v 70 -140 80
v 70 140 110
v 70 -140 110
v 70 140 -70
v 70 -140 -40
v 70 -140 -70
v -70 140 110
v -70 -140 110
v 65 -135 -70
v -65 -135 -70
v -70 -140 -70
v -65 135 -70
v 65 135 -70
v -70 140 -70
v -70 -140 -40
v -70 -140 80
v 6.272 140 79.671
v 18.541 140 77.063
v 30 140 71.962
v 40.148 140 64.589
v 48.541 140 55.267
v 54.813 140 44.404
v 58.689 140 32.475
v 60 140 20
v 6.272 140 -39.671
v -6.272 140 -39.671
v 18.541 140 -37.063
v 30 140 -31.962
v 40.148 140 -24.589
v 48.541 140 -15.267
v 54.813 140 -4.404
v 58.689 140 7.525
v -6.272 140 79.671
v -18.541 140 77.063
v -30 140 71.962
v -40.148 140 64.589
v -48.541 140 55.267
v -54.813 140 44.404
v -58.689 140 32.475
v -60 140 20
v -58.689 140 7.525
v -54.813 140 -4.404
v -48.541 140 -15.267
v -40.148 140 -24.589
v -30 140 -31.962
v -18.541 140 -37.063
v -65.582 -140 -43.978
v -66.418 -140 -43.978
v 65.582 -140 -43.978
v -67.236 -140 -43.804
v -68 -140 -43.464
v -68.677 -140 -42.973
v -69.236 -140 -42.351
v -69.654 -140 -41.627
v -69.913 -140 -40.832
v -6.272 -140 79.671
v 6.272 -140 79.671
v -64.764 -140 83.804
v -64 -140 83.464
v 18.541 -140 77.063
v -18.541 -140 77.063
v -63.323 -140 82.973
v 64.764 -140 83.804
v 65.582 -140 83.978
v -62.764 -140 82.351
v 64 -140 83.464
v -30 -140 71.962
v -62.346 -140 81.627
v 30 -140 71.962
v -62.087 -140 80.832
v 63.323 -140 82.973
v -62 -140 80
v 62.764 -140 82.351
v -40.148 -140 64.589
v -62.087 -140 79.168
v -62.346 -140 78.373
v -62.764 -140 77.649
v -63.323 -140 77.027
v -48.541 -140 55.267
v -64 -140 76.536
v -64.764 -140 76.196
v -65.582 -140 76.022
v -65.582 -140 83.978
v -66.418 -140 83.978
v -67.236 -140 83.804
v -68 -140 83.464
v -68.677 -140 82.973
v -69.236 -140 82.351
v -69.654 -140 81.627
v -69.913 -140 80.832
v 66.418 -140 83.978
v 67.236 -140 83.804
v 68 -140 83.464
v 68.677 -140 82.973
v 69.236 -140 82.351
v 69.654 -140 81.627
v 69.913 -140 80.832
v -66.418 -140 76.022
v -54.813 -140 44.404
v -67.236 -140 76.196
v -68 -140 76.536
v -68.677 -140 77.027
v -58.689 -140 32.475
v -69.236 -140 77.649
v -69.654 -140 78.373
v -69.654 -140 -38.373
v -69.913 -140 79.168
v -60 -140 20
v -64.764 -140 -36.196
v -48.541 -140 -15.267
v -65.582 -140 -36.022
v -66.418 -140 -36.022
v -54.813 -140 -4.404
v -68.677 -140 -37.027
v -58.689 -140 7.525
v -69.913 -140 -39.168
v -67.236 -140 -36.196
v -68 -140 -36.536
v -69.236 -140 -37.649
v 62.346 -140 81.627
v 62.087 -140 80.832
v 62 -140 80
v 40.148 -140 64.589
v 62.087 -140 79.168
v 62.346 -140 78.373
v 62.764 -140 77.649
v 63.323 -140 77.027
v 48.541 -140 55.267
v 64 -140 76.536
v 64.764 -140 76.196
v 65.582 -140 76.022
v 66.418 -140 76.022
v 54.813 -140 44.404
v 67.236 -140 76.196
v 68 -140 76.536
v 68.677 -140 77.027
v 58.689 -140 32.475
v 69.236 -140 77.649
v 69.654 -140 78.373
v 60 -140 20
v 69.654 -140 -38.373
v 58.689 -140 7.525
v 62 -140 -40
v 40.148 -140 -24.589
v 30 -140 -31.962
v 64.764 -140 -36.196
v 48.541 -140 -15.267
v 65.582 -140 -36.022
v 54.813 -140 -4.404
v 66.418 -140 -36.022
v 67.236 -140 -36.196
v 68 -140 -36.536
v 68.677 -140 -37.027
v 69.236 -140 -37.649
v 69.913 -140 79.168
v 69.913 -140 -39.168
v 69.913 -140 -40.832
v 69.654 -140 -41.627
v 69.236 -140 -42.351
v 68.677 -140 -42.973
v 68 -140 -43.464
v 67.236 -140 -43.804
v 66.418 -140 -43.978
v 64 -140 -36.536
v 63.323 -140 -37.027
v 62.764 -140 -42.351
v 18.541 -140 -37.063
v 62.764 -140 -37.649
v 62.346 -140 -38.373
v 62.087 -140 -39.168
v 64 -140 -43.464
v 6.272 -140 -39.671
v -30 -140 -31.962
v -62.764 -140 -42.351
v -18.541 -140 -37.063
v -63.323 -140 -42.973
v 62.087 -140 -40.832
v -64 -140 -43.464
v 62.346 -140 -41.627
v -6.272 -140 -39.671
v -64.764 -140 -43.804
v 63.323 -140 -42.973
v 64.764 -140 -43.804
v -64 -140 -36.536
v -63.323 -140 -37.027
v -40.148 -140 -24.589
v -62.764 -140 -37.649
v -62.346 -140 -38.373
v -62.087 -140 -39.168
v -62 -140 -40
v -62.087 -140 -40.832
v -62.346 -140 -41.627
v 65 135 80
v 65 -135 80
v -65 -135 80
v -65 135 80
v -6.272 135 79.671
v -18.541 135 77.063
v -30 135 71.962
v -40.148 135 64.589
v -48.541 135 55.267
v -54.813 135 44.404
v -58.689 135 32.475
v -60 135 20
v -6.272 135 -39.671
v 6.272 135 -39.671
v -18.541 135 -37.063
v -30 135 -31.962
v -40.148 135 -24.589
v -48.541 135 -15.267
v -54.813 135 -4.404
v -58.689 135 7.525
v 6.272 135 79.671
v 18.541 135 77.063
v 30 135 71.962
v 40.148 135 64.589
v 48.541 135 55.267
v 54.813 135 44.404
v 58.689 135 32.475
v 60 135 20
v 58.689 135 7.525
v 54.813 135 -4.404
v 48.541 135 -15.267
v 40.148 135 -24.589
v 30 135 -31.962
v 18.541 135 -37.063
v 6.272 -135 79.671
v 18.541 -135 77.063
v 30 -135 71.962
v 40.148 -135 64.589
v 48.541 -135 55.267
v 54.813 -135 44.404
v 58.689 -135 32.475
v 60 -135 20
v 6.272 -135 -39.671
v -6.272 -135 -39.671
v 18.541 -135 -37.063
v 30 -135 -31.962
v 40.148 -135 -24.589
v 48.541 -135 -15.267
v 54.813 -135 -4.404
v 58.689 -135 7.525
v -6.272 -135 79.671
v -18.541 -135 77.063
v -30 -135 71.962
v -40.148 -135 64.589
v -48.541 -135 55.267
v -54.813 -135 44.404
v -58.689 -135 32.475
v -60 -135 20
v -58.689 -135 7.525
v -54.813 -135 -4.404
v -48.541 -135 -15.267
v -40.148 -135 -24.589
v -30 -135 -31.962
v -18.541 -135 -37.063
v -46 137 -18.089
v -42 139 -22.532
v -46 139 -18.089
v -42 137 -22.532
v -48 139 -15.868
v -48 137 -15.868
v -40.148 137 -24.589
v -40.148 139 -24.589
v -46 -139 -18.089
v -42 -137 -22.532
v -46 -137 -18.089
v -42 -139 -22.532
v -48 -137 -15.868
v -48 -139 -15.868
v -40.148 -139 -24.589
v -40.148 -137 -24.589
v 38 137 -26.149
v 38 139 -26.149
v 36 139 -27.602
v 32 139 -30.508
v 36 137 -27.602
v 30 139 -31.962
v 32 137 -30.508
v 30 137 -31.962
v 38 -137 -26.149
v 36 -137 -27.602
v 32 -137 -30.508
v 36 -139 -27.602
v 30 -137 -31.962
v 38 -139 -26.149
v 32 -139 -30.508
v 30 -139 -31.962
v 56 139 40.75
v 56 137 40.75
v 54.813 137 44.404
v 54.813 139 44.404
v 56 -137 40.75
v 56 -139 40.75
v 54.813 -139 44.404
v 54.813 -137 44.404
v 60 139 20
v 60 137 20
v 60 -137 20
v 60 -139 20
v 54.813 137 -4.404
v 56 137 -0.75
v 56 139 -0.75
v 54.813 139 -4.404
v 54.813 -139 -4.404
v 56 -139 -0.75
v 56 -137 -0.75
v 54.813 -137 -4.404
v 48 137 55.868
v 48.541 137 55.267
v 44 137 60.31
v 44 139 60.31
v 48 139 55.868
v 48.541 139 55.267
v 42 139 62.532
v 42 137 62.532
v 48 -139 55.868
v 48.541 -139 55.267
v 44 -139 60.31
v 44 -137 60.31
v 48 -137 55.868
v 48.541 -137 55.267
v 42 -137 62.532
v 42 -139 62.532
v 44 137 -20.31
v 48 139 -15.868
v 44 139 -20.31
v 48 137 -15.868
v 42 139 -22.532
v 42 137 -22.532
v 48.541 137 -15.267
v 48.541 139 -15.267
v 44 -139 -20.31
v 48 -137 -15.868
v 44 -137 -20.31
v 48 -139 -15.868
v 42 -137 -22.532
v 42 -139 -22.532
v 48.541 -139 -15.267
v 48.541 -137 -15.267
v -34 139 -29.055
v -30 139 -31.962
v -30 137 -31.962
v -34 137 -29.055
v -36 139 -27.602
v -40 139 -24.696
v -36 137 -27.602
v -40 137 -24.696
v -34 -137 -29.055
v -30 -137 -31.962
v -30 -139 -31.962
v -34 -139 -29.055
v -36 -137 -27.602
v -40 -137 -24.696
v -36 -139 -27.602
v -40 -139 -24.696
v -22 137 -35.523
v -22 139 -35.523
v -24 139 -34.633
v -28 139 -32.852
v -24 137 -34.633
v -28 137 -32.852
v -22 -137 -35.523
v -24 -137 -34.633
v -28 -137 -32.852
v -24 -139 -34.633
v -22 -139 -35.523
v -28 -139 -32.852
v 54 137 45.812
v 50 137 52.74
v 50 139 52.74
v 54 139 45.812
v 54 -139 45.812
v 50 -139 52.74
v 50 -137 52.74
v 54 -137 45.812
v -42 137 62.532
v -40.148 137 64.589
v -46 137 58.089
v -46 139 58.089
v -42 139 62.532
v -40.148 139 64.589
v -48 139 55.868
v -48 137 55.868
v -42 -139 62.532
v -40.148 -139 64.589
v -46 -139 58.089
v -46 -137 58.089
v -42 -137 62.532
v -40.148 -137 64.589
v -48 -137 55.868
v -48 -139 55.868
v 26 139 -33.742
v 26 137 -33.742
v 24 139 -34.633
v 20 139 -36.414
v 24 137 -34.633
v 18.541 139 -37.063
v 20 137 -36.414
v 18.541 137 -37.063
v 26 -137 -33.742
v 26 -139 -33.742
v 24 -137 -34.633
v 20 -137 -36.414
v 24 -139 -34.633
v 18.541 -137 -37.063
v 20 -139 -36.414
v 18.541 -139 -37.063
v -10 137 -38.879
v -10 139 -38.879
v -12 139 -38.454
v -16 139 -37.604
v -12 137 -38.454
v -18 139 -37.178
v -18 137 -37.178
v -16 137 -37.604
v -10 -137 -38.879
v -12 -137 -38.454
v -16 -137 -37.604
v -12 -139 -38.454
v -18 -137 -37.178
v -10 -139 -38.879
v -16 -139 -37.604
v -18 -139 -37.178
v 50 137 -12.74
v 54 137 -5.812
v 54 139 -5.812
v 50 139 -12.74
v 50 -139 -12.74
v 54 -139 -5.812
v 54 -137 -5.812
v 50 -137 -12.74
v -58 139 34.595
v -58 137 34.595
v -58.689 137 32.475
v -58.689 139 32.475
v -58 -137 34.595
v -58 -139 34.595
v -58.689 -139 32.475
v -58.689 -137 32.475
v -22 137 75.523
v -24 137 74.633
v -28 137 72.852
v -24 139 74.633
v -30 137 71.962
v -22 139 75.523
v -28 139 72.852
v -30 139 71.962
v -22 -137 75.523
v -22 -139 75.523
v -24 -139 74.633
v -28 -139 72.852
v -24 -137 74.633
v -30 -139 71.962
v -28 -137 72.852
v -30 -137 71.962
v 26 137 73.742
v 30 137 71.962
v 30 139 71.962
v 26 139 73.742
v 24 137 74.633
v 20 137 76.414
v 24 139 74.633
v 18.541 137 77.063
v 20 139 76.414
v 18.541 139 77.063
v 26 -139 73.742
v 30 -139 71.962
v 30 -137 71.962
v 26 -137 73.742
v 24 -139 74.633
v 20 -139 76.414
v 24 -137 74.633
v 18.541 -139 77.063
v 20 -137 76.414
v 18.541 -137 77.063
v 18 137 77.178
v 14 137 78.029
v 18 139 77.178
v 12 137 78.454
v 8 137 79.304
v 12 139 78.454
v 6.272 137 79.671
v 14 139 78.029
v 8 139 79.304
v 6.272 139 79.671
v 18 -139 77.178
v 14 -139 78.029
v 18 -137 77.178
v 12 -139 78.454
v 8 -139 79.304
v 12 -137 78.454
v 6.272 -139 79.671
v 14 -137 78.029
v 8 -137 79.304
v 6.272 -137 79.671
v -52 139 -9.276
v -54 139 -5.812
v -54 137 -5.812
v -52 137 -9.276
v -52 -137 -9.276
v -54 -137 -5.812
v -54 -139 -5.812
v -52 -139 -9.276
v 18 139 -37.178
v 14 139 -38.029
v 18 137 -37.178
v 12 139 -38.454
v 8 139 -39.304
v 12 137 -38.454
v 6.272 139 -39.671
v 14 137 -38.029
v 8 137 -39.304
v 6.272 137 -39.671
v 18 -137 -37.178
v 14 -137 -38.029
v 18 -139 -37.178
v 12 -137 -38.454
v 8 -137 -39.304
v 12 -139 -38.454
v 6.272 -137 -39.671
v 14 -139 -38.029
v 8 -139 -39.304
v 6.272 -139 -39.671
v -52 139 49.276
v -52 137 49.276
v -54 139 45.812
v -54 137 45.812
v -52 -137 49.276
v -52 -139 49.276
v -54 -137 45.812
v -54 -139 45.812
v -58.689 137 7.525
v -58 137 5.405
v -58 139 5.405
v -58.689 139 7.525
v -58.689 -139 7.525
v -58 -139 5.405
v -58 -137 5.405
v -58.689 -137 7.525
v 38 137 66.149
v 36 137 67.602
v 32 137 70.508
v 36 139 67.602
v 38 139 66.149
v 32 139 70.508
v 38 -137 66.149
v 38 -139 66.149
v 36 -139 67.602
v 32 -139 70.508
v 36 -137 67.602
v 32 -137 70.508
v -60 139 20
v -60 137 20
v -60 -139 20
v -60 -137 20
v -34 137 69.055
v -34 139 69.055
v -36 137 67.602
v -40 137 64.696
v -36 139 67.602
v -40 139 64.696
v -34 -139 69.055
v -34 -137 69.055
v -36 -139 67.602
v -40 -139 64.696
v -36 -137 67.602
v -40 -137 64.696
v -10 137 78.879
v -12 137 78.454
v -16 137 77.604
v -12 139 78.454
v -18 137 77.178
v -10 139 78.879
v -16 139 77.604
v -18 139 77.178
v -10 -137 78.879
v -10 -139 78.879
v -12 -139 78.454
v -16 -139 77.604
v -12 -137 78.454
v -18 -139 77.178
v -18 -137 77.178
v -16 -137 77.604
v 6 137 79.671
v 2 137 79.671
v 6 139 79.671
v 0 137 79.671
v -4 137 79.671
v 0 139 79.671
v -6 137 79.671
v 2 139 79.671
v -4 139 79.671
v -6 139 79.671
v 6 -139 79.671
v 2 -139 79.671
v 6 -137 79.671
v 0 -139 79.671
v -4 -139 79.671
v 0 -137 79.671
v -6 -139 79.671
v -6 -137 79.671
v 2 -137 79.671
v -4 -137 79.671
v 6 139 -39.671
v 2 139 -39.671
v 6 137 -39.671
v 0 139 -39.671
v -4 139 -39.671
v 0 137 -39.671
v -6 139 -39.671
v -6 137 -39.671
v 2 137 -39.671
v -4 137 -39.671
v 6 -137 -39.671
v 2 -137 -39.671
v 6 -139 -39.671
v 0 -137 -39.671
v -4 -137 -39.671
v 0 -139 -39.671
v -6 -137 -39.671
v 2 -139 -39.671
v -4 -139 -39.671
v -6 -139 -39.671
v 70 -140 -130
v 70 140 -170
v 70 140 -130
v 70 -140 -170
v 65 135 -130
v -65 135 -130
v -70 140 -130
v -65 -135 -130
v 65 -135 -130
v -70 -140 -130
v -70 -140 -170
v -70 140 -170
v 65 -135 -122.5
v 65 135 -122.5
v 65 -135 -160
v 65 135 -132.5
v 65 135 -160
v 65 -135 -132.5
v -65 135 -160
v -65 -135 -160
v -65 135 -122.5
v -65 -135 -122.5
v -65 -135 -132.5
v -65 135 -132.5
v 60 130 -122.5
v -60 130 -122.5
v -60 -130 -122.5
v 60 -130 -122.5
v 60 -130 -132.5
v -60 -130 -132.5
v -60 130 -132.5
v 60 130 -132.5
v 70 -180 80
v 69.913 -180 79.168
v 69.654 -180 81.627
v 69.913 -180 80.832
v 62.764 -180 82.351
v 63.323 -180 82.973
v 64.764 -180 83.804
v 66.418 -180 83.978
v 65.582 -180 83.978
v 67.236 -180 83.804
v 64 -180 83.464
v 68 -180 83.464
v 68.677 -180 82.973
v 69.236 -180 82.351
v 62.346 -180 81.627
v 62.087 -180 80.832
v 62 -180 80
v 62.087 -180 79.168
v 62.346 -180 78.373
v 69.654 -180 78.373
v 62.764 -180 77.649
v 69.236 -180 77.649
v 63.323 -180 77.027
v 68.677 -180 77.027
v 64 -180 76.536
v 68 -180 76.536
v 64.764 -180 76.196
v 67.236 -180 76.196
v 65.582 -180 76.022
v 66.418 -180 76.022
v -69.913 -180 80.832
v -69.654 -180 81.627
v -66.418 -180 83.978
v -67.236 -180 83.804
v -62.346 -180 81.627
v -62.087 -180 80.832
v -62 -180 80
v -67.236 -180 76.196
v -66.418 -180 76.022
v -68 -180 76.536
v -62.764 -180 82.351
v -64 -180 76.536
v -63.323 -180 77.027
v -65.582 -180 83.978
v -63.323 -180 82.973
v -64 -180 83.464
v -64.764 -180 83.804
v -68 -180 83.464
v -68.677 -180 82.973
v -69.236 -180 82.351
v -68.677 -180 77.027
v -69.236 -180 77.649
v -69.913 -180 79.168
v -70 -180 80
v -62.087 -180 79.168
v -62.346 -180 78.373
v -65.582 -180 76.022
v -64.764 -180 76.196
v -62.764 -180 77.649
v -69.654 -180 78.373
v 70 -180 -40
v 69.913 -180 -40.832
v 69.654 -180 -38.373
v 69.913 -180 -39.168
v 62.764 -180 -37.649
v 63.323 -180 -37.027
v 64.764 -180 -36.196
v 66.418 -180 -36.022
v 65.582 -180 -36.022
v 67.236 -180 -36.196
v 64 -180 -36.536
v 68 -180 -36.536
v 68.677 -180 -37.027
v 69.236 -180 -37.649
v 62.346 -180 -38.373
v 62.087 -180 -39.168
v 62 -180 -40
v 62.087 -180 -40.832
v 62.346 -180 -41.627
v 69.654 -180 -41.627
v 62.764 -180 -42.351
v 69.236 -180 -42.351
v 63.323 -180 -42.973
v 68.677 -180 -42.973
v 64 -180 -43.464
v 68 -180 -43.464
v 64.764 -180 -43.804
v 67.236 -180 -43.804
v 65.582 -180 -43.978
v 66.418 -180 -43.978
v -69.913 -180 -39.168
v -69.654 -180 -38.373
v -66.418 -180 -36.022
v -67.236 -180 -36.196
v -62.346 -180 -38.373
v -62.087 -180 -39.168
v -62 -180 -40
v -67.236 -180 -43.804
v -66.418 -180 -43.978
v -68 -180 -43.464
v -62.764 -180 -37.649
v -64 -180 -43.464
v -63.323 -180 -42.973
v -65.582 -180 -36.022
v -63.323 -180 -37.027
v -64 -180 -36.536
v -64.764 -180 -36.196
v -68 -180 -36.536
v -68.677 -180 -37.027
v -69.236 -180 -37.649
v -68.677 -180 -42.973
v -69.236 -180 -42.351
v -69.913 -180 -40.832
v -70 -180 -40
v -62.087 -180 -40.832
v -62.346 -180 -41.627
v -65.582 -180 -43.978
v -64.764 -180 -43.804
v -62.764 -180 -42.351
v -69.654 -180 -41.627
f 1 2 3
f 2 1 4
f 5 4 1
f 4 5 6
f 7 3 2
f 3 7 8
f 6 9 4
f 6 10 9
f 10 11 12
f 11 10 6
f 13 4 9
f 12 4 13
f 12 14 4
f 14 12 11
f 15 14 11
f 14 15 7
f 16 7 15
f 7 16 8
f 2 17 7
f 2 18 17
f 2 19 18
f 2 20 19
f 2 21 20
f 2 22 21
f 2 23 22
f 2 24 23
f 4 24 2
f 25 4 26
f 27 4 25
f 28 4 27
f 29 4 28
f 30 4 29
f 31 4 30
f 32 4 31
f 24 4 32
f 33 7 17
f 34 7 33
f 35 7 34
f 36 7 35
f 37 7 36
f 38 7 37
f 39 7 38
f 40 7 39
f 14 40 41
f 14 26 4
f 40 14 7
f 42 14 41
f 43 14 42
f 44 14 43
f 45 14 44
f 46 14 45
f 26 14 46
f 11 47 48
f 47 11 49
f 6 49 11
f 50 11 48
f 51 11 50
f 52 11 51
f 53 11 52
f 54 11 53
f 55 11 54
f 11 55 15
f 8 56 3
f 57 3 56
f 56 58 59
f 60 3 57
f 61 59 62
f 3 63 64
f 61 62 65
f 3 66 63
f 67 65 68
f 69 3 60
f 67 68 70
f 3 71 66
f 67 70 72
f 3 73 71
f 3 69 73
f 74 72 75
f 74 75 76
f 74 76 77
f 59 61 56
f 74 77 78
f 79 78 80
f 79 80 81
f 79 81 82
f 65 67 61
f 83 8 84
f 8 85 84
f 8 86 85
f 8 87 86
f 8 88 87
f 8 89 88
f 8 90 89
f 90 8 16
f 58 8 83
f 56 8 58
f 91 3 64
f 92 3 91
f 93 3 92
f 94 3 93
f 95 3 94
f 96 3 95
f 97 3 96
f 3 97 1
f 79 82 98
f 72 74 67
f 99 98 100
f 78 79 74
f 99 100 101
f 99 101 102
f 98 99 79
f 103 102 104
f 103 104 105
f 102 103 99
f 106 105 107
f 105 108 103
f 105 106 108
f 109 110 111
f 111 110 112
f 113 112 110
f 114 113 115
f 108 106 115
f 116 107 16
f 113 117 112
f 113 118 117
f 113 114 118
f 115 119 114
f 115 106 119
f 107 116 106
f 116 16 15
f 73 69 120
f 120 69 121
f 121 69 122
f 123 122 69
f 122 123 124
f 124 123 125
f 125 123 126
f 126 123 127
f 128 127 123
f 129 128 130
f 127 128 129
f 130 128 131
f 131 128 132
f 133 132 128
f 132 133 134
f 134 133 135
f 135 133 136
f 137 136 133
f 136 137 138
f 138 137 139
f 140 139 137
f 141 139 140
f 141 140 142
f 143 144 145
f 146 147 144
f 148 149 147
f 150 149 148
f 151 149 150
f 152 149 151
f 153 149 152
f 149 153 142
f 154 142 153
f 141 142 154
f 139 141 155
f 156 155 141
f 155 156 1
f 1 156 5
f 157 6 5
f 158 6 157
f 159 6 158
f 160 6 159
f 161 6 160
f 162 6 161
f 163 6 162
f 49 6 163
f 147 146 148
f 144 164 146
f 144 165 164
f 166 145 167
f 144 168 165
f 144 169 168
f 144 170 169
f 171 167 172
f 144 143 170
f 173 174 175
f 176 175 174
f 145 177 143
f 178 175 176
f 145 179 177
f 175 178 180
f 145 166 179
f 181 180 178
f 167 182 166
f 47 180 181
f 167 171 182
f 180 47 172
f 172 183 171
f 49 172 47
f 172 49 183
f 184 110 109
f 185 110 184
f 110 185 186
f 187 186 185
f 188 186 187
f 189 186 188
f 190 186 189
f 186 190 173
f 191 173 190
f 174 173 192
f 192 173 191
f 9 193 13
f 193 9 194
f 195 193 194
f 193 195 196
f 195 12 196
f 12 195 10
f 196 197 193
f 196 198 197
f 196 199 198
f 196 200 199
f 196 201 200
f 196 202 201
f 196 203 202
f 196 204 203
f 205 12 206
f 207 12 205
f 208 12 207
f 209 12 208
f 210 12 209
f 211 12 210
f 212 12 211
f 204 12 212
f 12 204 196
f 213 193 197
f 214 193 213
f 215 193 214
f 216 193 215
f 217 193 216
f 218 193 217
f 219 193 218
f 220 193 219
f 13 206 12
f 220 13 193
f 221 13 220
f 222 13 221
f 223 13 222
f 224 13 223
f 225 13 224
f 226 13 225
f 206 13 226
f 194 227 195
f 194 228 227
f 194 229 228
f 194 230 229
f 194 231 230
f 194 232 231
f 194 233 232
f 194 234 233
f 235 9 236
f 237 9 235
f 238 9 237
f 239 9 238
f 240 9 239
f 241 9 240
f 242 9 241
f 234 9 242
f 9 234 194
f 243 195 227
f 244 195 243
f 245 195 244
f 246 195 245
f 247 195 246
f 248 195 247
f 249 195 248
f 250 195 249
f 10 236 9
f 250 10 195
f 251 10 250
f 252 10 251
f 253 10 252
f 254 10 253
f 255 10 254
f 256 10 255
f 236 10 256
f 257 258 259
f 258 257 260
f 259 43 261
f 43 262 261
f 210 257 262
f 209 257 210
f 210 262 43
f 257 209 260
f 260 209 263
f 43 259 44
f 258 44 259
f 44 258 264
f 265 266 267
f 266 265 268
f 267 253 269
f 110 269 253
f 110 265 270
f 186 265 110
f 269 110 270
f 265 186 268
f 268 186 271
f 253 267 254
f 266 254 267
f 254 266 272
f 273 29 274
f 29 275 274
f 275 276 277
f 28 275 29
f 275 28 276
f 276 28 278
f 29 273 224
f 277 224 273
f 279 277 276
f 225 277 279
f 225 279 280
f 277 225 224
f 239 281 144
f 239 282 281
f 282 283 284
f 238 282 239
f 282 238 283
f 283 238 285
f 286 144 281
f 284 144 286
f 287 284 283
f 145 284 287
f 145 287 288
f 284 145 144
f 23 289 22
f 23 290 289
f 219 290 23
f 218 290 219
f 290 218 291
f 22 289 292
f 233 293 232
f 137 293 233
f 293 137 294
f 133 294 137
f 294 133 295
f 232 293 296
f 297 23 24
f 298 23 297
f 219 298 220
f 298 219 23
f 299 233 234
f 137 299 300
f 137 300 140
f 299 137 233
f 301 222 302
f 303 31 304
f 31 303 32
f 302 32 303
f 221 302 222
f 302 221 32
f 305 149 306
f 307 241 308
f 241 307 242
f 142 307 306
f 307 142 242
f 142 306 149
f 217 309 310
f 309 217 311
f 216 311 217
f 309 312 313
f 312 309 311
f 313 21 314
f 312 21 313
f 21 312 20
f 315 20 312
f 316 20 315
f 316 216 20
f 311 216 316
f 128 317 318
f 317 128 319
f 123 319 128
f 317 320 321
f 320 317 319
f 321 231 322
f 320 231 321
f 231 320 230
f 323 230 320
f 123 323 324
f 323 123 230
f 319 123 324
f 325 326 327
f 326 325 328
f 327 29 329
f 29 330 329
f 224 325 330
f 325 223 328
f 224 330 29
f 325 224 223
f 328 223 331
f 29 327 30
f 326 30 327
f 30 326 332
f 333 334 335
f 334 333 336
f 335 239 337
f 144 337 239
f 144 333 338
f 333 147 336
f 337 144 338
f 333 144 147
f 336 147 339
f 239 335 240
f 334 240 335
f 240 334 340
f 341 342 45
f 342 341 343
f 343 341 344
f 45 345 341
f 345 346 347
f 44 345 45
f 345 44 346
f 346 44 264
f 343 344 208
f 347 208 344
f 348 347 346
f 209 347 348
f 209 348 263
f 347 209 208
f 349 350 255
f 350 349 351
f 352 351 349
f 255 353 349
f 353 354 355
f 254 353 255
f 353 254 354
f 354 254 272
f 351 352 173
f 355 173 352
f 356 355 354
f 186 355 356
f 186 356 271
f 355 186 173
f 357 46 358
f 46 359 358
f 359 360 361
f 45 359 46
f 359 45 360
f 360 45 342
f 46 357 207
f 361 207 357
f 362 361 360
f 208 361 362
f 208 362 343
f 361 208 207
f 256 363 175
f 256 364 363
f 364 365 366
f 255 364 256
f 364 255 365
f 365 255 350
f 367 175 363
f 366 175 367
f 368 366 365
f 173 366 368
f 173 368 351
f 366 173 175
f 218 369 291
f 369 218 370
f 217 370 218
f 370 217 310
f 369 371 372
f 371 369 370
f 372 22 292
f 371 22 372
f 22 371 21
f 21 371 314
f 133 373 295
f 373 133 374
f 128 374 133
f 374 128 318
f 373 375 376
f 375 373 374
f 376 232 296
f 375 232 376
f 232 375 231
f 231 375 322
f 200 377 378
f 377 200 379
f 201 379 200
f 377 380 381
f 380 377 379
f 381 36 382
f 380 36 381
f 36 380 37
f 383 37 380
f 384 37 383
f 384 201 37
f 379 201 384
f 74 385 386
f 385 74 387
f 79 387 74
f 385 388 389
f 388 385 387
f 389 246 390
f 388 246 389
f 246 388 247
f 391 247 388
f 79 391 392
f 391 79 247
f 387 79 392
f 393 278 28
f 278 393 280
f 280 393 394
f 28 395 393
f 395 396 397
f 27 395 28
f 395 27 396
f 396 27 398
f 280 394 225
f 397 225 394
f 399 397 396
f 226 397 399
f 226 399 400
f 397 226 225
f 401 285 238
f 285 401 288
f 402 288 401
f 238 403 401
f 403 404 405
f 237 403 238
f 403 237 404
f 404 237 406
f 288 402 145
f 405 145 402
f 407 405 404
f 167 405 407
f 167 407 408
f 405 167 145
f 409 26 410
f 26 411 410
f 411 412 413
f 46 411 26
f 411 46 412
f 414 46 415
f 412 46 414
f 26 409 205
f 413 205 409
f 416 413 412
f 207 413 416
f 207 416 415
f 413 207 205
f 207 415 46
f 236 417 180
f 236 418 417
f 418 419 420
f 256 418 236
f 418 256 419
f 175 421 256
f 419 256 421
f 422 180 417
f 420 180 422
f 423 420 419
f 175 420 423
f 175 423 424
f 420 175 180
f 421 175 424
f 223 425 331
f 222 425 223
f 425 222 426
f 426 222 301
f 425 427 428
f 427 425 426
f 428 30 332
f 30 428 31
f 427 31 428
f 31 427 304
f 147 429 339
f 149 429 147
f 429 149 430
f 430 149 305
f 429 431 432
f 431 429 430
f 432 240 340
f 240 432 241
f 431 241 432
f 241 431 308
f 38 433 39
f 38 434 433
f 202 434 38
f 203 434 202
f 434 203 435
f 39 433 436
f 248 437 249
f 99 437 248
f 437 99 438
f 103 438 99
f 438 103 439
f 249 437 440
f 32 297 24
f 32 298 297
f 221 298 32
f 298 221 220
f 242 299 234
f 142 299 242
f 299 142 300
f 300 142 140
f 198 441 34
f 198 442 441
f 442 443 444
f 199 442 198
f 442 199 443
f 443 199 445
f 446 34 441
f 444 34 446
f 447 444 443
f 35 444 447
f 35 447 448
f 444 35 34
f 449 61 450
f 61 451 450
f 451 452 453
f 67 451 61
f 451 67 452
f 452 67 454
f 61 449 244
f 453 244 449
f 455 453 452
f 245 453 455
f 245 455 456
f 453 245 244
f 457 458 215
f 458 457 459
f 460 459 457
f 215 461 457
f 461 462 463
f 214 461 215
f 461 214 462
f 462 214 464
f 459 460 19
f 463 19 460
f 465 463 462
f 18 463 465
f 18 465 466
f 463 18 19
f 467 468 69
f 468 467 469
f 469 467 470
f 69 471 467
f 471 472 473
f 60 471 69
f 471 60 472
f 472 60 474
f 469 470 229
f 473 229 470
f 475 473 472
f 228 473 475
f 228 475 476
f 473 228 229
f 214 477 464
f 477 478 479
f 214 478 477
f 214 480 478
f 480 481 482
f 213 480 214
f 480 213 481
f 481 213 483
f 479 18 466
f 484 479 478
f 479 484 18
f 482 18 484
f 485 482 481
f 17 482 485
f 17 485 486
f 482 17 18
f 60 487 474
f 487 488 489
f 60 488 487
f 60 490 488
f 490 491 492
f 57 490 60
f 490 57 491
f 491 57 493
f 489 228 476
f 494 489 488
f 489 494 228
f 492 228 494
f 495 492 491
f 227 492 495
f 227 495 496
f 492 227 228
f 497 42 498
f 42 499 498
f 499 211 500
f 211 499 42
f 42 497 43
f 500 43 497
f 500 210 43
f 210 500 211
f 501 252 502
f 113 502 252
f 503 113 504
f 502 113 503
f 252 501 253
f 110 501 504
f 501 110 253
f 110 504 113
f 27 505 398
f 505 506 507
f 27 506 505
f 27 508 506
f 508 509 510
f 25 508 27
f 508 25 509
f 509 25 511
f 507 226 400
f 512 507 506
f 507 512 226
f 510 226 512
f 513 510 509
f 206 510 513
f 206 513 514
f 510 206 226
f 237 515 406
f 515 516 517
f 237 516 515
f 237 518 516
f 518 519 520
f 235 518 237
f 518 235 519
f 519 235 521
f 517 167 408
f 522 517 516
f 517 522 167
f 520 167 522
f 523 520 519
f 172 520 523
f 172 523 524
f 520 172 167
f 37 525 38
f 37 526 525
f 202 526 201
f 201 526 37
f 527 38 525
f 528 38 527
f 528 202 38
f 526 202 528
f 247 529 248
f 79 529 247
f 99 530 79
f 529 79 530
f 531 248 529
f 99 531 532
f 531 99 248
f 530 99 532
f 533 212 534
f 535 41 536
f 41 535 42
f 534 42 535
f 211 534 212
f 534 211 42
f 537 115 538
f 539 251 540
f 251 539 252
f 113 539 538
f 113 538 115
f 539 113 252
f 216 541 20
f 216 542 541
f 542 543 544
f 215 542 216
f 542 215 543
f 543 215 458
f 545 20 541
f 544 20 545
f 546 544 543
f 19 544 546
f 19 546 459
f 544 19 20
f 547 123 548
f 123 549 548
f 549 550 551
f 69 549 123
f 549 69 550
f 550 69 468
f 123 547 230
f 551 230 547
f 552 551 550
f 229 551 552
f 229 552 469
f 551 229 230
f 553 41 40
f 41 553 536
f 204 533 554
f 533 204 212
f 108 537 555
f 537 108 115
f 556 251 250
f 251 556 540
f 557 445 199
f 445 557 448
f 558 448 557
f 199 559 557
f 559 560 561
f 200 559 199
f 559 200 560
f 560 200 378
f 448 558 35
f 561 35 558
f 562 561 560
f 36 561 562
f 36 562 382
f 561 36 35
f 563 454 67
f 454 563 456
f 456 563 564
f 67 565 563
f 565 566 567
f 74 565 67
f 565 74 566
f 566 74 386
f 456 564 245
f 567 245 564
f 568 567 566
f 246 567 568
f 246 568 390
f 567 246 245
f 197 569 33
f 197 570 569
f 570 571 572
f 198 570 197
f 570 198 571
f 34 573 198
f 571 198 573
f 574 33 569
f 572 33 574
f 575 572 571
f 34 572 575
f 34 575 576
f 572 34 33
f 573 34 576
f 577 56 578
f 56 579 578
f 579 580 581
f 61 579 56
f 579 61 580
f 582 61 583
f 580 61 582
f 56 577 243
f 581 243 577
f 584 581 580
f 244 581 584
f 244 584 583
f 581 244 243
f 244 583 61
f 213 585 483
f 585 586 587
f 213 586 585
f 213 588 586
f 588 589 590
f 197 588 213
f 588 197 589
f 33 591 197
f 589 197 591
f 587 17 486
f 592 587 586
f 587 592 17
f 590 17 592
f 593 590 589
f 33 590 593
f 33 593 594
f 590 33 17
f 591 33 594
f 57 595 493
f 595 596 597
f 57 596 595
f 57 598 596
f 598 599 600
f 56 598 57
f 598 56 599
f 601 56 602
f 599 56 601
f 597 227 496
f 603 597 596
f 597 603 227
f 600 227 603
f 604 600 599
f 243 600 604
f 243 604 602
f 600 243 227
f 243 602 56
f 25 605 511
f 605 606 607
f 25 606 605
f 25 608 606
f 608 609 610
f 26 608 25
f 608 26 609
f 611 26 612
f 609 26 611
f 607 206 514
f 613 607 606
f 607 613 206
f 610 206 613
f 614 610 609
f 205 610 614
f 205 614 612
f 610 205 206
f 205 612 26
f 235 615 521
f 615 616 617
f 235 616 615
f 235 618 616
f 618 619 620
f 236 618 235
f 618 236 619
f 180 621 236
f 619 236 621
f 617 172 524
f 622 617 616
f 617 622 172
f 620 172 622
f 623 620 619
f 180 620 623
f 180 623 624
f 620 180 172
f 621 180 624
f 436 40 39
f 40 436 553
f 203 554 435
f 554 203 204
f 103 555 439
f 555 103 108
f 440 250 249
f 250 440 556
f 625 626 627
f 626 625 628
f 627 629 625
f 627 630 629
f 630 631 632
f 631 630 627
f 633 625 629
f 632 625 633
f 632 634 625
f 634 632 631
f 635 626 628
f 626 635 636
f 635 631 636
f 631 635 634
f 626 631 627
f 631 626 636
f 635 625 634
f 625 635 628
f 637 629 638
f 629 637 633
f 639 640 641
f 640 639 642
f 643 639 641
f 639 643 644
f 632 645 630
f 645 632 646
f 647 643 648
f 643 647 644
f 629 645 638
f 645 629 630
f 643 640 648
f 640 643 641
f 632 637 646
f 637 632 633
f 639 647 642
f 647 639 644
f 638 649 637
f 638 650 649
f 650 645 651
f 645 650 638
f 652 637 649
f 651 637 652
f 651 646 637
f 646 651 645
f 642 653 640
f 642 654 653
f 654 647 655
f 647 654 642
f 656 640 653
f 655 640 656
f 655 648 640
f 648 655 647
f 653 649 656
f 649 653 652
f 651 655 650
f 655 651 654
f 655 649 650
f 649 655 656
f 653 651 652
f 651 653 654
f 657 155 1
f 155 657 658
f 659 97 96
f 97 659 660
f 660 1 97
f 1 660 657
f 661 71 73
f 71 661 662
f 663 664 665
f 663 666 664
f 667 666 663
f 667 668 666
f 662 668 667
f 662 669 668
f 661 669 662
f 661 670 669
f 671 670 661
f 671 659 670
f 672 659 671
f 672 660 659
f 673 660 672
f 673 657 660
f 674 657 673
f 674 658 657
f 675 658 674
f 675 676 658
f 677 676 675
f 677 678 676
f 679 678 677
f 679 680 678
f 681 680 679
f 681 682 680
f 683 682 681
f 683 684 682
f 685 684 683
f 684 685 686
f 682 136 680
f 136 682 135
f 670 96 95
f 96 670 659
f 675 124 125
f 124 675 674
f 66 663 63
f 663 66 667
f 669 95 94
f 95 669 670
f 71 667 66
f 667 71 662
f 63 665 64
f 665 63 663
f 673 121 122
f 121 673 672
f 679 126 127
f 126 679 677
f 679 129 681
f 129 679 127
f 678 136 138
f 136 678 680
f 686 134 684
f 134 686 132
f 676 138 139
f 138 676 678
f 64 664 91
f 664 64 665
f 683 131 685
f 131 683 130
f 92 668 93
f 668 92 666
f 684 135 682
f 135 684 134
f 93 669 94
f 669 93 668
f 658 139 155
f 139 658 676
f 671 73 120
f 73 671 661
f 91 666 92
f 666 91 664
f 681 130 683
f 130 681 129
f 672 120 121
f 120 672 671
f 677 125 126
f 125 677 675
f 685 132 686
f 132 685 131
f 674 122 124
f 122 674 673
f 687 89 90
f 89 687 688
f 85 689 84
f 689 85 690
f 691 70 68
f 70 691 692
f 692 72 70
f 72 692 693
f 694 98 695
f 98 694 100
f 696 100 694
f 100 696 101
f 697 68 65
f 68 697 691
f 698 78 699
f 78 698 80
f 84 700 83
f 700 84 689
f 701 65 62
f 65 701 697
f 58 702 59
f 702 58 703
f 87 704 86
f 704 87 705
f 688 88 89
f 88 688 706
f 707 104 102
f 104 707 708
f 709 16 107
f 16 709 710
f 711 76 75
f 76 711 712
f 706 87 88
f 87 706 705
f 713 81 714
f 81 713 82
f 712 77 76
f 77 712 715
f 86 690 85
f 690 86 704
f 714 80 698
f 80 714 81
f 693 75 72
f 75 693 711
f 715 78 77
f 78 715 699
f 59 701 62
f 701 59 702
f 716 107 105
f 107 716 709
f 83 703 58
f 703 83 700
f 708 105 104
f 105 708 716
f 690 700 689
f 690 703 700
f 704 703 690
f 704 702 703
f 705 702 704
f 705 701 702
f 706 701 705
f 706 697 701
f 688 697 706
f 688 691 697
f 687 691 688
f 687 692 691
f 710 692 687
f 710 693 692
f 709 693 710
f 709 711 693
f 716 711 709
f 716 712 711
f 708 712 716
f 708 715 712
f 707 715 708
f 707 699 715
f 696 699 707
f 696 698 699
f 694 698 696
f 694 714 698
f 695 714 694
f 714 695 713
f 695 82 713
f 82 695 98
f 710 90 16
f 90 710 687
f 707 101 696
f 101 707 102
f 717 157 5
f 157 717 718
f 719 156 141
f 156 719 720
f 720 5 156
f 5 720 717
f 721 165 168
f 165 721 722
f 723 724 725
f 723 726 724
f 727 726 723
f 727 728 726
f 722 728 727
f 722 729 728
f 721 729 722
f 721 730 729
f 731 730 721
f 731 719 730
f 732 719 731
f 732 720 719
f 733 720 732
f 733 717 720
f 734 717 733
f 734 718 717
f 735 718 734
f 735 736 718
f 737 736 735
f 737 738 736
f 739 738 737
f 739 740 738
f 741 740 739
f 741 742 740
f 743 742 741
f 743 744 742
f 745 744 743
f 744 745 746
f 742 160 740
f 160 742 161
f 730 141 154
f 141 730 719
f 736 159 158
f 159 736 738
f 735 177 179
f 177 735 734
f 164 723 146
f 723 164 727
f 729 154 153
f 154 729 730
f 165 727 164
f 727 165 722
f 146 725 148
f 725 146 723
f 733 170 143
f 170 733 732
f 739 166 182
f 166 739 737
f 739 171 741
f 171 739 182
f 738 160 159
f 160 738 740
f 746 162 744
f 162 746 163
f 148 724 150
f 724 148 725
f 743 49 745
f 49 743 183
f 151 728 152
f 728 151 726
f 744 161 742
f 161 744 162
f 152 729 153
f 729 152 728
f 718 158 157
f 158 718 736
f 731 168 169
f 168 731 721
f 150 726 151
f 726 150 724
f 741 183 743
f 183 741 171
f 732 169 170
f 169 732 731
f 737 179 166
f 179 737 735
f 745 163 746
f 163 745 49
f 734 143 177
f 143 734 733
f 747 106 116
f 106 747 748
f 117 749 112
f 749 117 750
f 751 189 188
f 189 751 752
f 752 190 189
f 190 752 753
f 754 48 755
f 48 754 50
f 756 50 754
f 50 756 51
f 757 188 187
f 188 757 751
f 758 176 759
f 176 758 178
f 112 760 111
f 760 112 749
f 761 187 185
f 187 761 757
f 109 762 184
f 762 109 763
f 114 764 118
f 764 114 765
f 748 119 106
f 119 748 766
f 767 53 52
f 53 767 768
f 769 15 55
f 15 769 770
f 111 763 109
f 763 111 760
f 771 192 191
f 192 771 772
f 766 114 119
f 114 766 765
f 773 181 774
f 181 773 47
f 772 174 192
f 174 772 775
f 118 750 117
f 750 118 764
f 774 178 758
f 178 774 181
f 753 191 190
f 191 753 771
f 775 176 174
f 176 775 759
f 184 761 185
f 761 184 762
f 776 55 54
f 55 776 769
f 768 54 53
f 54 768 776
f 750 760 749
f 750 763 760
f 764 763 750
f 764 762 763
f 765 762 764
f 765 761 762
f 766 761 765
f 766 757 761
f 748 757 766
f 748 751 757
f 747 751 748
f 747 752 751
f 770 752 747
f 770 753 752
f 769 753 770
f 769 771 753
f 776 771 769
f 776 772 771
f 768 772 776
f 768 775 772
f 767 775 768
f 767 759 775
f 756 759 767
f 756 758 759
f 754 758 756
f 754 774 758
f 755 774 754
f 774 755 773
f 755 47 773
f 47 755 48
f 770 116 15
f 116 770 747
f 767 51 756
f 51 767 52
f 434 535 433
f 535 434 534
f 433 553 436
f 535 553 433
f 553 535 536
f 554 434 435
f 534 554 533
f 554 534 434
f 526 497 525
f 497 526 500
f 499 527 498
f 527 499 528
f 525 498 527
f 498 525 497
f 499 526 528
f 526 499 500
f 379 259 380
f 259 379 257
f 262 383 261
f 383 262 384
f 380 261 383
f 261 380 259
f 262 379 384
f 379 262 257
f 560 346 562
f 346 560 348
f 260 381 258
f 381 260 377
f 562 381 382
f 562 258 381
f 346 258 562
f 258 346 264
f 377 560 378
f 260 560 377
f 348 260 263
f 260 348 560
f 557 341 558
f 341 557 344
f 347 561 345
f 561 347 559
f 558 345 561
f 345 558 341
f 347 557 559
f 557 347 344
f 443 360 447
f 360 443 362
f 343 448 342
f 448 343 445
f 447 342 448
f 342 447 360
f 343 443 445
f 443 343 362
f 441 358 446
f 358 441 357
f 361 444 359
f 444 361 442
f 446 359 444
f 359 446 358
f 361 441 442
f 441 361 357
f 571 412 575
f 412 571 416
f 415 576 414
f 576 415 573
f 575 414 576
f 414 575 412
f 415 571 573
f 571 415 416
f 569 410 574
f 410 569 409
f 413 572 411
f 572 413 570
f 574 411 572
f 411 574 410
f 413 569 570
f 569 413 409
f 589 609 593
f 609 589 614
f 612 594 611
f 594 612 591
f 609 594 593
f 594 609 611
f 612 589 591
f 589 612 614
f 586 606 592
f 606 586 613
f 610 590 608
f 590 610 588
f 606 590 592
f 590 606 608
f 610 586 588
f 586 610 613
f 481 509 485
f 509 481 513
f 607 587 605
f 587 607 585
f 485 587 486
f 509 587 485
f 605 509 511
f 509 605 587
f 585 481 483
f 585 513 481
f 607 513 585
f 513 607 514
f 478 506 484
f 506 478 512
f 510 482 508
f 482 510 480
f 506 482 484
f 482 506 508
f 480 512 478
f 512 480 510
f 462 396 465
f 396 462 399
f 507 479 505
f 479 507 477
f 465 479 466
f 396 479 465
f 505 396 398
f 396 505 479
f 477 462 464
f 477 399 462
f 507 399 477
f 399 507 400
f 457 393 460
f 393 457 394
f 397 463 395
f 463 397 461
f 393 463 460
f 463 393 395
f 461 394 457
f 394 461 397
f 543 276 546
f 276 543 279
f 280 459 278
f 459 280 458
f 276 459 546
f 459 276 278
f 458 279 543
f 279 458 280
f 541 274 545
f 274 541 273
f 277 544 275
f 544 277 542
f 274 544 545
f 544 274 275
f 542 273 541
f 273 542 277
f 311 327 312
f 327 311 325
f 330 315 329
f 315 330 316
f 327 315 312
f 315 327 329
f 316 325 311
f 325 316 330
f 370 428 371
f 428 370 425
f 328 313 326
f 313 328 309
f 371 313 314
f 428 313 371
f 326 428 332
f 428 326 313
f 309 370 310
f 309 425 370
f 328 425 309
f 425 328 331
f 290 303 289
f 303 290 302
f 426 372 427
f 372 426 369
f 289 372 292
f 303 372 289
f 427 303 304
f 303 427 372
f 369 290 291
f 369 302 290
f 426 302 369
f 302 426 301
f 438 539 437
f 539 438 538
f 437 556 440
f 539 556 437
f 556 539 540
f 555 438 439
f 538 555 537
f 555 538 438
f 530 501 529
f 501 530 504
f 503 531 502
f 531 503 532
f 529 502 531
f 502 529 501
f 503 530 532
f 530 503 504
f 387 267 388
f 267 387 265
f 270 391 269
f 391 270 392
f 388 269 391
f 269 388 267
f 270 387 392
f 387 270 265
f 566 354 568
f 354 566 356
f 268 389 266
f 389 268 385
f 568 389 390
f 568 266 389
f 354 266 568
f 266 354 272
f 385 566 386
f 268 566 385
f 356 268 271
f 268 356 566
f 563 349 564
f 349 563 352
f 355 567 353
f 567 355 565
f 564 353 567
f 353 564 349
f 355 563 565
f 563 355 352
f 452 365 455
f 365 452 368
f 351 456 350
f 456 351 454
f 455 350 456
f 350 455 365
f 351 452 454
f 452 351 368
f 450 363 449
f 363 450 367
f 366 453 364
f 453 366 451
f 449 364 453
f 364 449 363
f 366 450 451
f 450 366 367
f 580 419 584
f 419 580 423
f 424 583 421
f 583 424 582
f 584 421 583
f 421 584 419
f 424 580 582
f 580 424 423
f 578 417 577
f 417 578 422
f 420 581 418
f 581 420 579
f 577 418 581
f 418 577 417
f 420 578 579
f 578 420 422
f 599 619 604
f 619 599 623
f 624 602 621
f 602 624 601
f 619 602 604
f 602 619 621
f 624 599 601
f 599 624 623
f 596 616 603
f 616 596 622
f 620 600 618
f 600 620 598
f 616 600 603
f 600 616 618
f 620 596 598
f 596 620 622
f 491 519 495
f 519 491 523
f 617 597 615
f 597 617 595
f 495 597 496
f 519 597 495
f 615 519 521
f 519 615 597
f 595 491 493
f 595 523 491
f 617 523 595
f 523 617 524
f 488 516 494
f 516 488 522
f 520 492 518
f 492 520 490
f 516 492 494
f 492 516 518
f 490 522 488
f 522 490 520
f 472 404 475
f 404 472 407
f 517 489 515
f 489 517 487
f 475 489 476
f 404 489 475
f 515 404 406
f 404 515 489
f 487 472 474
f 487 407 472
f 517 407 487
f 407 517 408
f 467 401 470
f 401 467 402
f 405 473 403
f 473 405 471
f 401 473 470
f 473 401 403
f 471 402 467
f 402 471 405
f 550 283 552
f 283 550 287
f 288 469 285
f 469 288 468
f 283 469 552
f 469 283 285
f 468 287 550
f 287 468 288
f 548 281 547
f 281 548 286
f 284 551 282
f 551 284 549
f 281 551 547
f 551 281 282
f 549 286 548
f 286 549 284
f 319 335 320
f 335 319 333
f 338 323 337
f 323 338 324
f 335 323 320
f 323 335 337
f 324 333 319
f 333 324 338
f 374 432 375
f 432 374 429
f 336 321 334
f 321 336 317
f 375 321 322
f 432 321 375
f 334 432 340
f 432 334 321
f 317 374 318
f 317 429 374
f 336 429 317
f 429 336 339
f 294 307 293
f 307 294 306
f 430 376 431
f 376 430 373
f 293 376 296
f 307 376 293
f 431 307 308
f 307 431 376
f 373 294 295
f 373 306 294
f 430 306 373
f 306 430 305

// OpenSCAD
module box_top(h){
	translate([0,0,h]) difference(){
	    cube([140,280,180], center=true);
	    color("blue") translate([0,0,-h]) cube([130,270,160], center=true);
	    color("green") translate([0,0,h-20]) rotate([90,0,0]) cylinder(300,60,60, center = true);
	};

}
module box_bottom(h){
	translate([0,0,h]) difference(){
	    cube([140,280,40], center=true);
	    color("blue") translate([0,0,20]) cube([130,270,60], center=true);
	    color("green") translate([0,0,20]) rotate([90,0,0]);
	};
        translate([0,0,0.85*h]) difference(){
            cube([130,270,10], center=true);
            cube([120,260,10], center=true);
        }
}
module legs(position_z = 90, radius = 2){
	for (i = [1,-1]){
		for (j = [1, -1]){
			color("purple") translate([64*i,134*j,position_z]) cylinder(8,radius,radius, center = true, $fs = 0.5);
		}
	}
}

module pins(radius = 5){
	for (i = [1,-1]){
		for (j = [1, -1]){
			color("green") translate([66*j,-160,60*i]) rotate([90,0,0]) cylinder(40,radius,radius, center = true, $fs = 0.5);
		}
	}
};
module top(){
	difference(){
		translate([0,0,100]) cube([140,280,5], center=true);
		legs(98,2.5);
	}
}

module holder(height = 40, position_z = 0){
	for (n = [-15 : 15]) {
		translate([n*4,-140,position_z]){
			color("red") cube([1,280,height], center = false);
		}
	}
}
module grid(position_y = 0){
	for(n = [-10:10]){
		translate([6*n,position_y,-40]){
			cube([2, 2,120], center = false);
		}
	}
}
box_top(20);
box_bottom(-150);
translate([0,0,20]) pins(4);
//top();
//legs(89,2);
//holder(40, -88);
//holder(10, 80);
grid(137);
grid(-139);
